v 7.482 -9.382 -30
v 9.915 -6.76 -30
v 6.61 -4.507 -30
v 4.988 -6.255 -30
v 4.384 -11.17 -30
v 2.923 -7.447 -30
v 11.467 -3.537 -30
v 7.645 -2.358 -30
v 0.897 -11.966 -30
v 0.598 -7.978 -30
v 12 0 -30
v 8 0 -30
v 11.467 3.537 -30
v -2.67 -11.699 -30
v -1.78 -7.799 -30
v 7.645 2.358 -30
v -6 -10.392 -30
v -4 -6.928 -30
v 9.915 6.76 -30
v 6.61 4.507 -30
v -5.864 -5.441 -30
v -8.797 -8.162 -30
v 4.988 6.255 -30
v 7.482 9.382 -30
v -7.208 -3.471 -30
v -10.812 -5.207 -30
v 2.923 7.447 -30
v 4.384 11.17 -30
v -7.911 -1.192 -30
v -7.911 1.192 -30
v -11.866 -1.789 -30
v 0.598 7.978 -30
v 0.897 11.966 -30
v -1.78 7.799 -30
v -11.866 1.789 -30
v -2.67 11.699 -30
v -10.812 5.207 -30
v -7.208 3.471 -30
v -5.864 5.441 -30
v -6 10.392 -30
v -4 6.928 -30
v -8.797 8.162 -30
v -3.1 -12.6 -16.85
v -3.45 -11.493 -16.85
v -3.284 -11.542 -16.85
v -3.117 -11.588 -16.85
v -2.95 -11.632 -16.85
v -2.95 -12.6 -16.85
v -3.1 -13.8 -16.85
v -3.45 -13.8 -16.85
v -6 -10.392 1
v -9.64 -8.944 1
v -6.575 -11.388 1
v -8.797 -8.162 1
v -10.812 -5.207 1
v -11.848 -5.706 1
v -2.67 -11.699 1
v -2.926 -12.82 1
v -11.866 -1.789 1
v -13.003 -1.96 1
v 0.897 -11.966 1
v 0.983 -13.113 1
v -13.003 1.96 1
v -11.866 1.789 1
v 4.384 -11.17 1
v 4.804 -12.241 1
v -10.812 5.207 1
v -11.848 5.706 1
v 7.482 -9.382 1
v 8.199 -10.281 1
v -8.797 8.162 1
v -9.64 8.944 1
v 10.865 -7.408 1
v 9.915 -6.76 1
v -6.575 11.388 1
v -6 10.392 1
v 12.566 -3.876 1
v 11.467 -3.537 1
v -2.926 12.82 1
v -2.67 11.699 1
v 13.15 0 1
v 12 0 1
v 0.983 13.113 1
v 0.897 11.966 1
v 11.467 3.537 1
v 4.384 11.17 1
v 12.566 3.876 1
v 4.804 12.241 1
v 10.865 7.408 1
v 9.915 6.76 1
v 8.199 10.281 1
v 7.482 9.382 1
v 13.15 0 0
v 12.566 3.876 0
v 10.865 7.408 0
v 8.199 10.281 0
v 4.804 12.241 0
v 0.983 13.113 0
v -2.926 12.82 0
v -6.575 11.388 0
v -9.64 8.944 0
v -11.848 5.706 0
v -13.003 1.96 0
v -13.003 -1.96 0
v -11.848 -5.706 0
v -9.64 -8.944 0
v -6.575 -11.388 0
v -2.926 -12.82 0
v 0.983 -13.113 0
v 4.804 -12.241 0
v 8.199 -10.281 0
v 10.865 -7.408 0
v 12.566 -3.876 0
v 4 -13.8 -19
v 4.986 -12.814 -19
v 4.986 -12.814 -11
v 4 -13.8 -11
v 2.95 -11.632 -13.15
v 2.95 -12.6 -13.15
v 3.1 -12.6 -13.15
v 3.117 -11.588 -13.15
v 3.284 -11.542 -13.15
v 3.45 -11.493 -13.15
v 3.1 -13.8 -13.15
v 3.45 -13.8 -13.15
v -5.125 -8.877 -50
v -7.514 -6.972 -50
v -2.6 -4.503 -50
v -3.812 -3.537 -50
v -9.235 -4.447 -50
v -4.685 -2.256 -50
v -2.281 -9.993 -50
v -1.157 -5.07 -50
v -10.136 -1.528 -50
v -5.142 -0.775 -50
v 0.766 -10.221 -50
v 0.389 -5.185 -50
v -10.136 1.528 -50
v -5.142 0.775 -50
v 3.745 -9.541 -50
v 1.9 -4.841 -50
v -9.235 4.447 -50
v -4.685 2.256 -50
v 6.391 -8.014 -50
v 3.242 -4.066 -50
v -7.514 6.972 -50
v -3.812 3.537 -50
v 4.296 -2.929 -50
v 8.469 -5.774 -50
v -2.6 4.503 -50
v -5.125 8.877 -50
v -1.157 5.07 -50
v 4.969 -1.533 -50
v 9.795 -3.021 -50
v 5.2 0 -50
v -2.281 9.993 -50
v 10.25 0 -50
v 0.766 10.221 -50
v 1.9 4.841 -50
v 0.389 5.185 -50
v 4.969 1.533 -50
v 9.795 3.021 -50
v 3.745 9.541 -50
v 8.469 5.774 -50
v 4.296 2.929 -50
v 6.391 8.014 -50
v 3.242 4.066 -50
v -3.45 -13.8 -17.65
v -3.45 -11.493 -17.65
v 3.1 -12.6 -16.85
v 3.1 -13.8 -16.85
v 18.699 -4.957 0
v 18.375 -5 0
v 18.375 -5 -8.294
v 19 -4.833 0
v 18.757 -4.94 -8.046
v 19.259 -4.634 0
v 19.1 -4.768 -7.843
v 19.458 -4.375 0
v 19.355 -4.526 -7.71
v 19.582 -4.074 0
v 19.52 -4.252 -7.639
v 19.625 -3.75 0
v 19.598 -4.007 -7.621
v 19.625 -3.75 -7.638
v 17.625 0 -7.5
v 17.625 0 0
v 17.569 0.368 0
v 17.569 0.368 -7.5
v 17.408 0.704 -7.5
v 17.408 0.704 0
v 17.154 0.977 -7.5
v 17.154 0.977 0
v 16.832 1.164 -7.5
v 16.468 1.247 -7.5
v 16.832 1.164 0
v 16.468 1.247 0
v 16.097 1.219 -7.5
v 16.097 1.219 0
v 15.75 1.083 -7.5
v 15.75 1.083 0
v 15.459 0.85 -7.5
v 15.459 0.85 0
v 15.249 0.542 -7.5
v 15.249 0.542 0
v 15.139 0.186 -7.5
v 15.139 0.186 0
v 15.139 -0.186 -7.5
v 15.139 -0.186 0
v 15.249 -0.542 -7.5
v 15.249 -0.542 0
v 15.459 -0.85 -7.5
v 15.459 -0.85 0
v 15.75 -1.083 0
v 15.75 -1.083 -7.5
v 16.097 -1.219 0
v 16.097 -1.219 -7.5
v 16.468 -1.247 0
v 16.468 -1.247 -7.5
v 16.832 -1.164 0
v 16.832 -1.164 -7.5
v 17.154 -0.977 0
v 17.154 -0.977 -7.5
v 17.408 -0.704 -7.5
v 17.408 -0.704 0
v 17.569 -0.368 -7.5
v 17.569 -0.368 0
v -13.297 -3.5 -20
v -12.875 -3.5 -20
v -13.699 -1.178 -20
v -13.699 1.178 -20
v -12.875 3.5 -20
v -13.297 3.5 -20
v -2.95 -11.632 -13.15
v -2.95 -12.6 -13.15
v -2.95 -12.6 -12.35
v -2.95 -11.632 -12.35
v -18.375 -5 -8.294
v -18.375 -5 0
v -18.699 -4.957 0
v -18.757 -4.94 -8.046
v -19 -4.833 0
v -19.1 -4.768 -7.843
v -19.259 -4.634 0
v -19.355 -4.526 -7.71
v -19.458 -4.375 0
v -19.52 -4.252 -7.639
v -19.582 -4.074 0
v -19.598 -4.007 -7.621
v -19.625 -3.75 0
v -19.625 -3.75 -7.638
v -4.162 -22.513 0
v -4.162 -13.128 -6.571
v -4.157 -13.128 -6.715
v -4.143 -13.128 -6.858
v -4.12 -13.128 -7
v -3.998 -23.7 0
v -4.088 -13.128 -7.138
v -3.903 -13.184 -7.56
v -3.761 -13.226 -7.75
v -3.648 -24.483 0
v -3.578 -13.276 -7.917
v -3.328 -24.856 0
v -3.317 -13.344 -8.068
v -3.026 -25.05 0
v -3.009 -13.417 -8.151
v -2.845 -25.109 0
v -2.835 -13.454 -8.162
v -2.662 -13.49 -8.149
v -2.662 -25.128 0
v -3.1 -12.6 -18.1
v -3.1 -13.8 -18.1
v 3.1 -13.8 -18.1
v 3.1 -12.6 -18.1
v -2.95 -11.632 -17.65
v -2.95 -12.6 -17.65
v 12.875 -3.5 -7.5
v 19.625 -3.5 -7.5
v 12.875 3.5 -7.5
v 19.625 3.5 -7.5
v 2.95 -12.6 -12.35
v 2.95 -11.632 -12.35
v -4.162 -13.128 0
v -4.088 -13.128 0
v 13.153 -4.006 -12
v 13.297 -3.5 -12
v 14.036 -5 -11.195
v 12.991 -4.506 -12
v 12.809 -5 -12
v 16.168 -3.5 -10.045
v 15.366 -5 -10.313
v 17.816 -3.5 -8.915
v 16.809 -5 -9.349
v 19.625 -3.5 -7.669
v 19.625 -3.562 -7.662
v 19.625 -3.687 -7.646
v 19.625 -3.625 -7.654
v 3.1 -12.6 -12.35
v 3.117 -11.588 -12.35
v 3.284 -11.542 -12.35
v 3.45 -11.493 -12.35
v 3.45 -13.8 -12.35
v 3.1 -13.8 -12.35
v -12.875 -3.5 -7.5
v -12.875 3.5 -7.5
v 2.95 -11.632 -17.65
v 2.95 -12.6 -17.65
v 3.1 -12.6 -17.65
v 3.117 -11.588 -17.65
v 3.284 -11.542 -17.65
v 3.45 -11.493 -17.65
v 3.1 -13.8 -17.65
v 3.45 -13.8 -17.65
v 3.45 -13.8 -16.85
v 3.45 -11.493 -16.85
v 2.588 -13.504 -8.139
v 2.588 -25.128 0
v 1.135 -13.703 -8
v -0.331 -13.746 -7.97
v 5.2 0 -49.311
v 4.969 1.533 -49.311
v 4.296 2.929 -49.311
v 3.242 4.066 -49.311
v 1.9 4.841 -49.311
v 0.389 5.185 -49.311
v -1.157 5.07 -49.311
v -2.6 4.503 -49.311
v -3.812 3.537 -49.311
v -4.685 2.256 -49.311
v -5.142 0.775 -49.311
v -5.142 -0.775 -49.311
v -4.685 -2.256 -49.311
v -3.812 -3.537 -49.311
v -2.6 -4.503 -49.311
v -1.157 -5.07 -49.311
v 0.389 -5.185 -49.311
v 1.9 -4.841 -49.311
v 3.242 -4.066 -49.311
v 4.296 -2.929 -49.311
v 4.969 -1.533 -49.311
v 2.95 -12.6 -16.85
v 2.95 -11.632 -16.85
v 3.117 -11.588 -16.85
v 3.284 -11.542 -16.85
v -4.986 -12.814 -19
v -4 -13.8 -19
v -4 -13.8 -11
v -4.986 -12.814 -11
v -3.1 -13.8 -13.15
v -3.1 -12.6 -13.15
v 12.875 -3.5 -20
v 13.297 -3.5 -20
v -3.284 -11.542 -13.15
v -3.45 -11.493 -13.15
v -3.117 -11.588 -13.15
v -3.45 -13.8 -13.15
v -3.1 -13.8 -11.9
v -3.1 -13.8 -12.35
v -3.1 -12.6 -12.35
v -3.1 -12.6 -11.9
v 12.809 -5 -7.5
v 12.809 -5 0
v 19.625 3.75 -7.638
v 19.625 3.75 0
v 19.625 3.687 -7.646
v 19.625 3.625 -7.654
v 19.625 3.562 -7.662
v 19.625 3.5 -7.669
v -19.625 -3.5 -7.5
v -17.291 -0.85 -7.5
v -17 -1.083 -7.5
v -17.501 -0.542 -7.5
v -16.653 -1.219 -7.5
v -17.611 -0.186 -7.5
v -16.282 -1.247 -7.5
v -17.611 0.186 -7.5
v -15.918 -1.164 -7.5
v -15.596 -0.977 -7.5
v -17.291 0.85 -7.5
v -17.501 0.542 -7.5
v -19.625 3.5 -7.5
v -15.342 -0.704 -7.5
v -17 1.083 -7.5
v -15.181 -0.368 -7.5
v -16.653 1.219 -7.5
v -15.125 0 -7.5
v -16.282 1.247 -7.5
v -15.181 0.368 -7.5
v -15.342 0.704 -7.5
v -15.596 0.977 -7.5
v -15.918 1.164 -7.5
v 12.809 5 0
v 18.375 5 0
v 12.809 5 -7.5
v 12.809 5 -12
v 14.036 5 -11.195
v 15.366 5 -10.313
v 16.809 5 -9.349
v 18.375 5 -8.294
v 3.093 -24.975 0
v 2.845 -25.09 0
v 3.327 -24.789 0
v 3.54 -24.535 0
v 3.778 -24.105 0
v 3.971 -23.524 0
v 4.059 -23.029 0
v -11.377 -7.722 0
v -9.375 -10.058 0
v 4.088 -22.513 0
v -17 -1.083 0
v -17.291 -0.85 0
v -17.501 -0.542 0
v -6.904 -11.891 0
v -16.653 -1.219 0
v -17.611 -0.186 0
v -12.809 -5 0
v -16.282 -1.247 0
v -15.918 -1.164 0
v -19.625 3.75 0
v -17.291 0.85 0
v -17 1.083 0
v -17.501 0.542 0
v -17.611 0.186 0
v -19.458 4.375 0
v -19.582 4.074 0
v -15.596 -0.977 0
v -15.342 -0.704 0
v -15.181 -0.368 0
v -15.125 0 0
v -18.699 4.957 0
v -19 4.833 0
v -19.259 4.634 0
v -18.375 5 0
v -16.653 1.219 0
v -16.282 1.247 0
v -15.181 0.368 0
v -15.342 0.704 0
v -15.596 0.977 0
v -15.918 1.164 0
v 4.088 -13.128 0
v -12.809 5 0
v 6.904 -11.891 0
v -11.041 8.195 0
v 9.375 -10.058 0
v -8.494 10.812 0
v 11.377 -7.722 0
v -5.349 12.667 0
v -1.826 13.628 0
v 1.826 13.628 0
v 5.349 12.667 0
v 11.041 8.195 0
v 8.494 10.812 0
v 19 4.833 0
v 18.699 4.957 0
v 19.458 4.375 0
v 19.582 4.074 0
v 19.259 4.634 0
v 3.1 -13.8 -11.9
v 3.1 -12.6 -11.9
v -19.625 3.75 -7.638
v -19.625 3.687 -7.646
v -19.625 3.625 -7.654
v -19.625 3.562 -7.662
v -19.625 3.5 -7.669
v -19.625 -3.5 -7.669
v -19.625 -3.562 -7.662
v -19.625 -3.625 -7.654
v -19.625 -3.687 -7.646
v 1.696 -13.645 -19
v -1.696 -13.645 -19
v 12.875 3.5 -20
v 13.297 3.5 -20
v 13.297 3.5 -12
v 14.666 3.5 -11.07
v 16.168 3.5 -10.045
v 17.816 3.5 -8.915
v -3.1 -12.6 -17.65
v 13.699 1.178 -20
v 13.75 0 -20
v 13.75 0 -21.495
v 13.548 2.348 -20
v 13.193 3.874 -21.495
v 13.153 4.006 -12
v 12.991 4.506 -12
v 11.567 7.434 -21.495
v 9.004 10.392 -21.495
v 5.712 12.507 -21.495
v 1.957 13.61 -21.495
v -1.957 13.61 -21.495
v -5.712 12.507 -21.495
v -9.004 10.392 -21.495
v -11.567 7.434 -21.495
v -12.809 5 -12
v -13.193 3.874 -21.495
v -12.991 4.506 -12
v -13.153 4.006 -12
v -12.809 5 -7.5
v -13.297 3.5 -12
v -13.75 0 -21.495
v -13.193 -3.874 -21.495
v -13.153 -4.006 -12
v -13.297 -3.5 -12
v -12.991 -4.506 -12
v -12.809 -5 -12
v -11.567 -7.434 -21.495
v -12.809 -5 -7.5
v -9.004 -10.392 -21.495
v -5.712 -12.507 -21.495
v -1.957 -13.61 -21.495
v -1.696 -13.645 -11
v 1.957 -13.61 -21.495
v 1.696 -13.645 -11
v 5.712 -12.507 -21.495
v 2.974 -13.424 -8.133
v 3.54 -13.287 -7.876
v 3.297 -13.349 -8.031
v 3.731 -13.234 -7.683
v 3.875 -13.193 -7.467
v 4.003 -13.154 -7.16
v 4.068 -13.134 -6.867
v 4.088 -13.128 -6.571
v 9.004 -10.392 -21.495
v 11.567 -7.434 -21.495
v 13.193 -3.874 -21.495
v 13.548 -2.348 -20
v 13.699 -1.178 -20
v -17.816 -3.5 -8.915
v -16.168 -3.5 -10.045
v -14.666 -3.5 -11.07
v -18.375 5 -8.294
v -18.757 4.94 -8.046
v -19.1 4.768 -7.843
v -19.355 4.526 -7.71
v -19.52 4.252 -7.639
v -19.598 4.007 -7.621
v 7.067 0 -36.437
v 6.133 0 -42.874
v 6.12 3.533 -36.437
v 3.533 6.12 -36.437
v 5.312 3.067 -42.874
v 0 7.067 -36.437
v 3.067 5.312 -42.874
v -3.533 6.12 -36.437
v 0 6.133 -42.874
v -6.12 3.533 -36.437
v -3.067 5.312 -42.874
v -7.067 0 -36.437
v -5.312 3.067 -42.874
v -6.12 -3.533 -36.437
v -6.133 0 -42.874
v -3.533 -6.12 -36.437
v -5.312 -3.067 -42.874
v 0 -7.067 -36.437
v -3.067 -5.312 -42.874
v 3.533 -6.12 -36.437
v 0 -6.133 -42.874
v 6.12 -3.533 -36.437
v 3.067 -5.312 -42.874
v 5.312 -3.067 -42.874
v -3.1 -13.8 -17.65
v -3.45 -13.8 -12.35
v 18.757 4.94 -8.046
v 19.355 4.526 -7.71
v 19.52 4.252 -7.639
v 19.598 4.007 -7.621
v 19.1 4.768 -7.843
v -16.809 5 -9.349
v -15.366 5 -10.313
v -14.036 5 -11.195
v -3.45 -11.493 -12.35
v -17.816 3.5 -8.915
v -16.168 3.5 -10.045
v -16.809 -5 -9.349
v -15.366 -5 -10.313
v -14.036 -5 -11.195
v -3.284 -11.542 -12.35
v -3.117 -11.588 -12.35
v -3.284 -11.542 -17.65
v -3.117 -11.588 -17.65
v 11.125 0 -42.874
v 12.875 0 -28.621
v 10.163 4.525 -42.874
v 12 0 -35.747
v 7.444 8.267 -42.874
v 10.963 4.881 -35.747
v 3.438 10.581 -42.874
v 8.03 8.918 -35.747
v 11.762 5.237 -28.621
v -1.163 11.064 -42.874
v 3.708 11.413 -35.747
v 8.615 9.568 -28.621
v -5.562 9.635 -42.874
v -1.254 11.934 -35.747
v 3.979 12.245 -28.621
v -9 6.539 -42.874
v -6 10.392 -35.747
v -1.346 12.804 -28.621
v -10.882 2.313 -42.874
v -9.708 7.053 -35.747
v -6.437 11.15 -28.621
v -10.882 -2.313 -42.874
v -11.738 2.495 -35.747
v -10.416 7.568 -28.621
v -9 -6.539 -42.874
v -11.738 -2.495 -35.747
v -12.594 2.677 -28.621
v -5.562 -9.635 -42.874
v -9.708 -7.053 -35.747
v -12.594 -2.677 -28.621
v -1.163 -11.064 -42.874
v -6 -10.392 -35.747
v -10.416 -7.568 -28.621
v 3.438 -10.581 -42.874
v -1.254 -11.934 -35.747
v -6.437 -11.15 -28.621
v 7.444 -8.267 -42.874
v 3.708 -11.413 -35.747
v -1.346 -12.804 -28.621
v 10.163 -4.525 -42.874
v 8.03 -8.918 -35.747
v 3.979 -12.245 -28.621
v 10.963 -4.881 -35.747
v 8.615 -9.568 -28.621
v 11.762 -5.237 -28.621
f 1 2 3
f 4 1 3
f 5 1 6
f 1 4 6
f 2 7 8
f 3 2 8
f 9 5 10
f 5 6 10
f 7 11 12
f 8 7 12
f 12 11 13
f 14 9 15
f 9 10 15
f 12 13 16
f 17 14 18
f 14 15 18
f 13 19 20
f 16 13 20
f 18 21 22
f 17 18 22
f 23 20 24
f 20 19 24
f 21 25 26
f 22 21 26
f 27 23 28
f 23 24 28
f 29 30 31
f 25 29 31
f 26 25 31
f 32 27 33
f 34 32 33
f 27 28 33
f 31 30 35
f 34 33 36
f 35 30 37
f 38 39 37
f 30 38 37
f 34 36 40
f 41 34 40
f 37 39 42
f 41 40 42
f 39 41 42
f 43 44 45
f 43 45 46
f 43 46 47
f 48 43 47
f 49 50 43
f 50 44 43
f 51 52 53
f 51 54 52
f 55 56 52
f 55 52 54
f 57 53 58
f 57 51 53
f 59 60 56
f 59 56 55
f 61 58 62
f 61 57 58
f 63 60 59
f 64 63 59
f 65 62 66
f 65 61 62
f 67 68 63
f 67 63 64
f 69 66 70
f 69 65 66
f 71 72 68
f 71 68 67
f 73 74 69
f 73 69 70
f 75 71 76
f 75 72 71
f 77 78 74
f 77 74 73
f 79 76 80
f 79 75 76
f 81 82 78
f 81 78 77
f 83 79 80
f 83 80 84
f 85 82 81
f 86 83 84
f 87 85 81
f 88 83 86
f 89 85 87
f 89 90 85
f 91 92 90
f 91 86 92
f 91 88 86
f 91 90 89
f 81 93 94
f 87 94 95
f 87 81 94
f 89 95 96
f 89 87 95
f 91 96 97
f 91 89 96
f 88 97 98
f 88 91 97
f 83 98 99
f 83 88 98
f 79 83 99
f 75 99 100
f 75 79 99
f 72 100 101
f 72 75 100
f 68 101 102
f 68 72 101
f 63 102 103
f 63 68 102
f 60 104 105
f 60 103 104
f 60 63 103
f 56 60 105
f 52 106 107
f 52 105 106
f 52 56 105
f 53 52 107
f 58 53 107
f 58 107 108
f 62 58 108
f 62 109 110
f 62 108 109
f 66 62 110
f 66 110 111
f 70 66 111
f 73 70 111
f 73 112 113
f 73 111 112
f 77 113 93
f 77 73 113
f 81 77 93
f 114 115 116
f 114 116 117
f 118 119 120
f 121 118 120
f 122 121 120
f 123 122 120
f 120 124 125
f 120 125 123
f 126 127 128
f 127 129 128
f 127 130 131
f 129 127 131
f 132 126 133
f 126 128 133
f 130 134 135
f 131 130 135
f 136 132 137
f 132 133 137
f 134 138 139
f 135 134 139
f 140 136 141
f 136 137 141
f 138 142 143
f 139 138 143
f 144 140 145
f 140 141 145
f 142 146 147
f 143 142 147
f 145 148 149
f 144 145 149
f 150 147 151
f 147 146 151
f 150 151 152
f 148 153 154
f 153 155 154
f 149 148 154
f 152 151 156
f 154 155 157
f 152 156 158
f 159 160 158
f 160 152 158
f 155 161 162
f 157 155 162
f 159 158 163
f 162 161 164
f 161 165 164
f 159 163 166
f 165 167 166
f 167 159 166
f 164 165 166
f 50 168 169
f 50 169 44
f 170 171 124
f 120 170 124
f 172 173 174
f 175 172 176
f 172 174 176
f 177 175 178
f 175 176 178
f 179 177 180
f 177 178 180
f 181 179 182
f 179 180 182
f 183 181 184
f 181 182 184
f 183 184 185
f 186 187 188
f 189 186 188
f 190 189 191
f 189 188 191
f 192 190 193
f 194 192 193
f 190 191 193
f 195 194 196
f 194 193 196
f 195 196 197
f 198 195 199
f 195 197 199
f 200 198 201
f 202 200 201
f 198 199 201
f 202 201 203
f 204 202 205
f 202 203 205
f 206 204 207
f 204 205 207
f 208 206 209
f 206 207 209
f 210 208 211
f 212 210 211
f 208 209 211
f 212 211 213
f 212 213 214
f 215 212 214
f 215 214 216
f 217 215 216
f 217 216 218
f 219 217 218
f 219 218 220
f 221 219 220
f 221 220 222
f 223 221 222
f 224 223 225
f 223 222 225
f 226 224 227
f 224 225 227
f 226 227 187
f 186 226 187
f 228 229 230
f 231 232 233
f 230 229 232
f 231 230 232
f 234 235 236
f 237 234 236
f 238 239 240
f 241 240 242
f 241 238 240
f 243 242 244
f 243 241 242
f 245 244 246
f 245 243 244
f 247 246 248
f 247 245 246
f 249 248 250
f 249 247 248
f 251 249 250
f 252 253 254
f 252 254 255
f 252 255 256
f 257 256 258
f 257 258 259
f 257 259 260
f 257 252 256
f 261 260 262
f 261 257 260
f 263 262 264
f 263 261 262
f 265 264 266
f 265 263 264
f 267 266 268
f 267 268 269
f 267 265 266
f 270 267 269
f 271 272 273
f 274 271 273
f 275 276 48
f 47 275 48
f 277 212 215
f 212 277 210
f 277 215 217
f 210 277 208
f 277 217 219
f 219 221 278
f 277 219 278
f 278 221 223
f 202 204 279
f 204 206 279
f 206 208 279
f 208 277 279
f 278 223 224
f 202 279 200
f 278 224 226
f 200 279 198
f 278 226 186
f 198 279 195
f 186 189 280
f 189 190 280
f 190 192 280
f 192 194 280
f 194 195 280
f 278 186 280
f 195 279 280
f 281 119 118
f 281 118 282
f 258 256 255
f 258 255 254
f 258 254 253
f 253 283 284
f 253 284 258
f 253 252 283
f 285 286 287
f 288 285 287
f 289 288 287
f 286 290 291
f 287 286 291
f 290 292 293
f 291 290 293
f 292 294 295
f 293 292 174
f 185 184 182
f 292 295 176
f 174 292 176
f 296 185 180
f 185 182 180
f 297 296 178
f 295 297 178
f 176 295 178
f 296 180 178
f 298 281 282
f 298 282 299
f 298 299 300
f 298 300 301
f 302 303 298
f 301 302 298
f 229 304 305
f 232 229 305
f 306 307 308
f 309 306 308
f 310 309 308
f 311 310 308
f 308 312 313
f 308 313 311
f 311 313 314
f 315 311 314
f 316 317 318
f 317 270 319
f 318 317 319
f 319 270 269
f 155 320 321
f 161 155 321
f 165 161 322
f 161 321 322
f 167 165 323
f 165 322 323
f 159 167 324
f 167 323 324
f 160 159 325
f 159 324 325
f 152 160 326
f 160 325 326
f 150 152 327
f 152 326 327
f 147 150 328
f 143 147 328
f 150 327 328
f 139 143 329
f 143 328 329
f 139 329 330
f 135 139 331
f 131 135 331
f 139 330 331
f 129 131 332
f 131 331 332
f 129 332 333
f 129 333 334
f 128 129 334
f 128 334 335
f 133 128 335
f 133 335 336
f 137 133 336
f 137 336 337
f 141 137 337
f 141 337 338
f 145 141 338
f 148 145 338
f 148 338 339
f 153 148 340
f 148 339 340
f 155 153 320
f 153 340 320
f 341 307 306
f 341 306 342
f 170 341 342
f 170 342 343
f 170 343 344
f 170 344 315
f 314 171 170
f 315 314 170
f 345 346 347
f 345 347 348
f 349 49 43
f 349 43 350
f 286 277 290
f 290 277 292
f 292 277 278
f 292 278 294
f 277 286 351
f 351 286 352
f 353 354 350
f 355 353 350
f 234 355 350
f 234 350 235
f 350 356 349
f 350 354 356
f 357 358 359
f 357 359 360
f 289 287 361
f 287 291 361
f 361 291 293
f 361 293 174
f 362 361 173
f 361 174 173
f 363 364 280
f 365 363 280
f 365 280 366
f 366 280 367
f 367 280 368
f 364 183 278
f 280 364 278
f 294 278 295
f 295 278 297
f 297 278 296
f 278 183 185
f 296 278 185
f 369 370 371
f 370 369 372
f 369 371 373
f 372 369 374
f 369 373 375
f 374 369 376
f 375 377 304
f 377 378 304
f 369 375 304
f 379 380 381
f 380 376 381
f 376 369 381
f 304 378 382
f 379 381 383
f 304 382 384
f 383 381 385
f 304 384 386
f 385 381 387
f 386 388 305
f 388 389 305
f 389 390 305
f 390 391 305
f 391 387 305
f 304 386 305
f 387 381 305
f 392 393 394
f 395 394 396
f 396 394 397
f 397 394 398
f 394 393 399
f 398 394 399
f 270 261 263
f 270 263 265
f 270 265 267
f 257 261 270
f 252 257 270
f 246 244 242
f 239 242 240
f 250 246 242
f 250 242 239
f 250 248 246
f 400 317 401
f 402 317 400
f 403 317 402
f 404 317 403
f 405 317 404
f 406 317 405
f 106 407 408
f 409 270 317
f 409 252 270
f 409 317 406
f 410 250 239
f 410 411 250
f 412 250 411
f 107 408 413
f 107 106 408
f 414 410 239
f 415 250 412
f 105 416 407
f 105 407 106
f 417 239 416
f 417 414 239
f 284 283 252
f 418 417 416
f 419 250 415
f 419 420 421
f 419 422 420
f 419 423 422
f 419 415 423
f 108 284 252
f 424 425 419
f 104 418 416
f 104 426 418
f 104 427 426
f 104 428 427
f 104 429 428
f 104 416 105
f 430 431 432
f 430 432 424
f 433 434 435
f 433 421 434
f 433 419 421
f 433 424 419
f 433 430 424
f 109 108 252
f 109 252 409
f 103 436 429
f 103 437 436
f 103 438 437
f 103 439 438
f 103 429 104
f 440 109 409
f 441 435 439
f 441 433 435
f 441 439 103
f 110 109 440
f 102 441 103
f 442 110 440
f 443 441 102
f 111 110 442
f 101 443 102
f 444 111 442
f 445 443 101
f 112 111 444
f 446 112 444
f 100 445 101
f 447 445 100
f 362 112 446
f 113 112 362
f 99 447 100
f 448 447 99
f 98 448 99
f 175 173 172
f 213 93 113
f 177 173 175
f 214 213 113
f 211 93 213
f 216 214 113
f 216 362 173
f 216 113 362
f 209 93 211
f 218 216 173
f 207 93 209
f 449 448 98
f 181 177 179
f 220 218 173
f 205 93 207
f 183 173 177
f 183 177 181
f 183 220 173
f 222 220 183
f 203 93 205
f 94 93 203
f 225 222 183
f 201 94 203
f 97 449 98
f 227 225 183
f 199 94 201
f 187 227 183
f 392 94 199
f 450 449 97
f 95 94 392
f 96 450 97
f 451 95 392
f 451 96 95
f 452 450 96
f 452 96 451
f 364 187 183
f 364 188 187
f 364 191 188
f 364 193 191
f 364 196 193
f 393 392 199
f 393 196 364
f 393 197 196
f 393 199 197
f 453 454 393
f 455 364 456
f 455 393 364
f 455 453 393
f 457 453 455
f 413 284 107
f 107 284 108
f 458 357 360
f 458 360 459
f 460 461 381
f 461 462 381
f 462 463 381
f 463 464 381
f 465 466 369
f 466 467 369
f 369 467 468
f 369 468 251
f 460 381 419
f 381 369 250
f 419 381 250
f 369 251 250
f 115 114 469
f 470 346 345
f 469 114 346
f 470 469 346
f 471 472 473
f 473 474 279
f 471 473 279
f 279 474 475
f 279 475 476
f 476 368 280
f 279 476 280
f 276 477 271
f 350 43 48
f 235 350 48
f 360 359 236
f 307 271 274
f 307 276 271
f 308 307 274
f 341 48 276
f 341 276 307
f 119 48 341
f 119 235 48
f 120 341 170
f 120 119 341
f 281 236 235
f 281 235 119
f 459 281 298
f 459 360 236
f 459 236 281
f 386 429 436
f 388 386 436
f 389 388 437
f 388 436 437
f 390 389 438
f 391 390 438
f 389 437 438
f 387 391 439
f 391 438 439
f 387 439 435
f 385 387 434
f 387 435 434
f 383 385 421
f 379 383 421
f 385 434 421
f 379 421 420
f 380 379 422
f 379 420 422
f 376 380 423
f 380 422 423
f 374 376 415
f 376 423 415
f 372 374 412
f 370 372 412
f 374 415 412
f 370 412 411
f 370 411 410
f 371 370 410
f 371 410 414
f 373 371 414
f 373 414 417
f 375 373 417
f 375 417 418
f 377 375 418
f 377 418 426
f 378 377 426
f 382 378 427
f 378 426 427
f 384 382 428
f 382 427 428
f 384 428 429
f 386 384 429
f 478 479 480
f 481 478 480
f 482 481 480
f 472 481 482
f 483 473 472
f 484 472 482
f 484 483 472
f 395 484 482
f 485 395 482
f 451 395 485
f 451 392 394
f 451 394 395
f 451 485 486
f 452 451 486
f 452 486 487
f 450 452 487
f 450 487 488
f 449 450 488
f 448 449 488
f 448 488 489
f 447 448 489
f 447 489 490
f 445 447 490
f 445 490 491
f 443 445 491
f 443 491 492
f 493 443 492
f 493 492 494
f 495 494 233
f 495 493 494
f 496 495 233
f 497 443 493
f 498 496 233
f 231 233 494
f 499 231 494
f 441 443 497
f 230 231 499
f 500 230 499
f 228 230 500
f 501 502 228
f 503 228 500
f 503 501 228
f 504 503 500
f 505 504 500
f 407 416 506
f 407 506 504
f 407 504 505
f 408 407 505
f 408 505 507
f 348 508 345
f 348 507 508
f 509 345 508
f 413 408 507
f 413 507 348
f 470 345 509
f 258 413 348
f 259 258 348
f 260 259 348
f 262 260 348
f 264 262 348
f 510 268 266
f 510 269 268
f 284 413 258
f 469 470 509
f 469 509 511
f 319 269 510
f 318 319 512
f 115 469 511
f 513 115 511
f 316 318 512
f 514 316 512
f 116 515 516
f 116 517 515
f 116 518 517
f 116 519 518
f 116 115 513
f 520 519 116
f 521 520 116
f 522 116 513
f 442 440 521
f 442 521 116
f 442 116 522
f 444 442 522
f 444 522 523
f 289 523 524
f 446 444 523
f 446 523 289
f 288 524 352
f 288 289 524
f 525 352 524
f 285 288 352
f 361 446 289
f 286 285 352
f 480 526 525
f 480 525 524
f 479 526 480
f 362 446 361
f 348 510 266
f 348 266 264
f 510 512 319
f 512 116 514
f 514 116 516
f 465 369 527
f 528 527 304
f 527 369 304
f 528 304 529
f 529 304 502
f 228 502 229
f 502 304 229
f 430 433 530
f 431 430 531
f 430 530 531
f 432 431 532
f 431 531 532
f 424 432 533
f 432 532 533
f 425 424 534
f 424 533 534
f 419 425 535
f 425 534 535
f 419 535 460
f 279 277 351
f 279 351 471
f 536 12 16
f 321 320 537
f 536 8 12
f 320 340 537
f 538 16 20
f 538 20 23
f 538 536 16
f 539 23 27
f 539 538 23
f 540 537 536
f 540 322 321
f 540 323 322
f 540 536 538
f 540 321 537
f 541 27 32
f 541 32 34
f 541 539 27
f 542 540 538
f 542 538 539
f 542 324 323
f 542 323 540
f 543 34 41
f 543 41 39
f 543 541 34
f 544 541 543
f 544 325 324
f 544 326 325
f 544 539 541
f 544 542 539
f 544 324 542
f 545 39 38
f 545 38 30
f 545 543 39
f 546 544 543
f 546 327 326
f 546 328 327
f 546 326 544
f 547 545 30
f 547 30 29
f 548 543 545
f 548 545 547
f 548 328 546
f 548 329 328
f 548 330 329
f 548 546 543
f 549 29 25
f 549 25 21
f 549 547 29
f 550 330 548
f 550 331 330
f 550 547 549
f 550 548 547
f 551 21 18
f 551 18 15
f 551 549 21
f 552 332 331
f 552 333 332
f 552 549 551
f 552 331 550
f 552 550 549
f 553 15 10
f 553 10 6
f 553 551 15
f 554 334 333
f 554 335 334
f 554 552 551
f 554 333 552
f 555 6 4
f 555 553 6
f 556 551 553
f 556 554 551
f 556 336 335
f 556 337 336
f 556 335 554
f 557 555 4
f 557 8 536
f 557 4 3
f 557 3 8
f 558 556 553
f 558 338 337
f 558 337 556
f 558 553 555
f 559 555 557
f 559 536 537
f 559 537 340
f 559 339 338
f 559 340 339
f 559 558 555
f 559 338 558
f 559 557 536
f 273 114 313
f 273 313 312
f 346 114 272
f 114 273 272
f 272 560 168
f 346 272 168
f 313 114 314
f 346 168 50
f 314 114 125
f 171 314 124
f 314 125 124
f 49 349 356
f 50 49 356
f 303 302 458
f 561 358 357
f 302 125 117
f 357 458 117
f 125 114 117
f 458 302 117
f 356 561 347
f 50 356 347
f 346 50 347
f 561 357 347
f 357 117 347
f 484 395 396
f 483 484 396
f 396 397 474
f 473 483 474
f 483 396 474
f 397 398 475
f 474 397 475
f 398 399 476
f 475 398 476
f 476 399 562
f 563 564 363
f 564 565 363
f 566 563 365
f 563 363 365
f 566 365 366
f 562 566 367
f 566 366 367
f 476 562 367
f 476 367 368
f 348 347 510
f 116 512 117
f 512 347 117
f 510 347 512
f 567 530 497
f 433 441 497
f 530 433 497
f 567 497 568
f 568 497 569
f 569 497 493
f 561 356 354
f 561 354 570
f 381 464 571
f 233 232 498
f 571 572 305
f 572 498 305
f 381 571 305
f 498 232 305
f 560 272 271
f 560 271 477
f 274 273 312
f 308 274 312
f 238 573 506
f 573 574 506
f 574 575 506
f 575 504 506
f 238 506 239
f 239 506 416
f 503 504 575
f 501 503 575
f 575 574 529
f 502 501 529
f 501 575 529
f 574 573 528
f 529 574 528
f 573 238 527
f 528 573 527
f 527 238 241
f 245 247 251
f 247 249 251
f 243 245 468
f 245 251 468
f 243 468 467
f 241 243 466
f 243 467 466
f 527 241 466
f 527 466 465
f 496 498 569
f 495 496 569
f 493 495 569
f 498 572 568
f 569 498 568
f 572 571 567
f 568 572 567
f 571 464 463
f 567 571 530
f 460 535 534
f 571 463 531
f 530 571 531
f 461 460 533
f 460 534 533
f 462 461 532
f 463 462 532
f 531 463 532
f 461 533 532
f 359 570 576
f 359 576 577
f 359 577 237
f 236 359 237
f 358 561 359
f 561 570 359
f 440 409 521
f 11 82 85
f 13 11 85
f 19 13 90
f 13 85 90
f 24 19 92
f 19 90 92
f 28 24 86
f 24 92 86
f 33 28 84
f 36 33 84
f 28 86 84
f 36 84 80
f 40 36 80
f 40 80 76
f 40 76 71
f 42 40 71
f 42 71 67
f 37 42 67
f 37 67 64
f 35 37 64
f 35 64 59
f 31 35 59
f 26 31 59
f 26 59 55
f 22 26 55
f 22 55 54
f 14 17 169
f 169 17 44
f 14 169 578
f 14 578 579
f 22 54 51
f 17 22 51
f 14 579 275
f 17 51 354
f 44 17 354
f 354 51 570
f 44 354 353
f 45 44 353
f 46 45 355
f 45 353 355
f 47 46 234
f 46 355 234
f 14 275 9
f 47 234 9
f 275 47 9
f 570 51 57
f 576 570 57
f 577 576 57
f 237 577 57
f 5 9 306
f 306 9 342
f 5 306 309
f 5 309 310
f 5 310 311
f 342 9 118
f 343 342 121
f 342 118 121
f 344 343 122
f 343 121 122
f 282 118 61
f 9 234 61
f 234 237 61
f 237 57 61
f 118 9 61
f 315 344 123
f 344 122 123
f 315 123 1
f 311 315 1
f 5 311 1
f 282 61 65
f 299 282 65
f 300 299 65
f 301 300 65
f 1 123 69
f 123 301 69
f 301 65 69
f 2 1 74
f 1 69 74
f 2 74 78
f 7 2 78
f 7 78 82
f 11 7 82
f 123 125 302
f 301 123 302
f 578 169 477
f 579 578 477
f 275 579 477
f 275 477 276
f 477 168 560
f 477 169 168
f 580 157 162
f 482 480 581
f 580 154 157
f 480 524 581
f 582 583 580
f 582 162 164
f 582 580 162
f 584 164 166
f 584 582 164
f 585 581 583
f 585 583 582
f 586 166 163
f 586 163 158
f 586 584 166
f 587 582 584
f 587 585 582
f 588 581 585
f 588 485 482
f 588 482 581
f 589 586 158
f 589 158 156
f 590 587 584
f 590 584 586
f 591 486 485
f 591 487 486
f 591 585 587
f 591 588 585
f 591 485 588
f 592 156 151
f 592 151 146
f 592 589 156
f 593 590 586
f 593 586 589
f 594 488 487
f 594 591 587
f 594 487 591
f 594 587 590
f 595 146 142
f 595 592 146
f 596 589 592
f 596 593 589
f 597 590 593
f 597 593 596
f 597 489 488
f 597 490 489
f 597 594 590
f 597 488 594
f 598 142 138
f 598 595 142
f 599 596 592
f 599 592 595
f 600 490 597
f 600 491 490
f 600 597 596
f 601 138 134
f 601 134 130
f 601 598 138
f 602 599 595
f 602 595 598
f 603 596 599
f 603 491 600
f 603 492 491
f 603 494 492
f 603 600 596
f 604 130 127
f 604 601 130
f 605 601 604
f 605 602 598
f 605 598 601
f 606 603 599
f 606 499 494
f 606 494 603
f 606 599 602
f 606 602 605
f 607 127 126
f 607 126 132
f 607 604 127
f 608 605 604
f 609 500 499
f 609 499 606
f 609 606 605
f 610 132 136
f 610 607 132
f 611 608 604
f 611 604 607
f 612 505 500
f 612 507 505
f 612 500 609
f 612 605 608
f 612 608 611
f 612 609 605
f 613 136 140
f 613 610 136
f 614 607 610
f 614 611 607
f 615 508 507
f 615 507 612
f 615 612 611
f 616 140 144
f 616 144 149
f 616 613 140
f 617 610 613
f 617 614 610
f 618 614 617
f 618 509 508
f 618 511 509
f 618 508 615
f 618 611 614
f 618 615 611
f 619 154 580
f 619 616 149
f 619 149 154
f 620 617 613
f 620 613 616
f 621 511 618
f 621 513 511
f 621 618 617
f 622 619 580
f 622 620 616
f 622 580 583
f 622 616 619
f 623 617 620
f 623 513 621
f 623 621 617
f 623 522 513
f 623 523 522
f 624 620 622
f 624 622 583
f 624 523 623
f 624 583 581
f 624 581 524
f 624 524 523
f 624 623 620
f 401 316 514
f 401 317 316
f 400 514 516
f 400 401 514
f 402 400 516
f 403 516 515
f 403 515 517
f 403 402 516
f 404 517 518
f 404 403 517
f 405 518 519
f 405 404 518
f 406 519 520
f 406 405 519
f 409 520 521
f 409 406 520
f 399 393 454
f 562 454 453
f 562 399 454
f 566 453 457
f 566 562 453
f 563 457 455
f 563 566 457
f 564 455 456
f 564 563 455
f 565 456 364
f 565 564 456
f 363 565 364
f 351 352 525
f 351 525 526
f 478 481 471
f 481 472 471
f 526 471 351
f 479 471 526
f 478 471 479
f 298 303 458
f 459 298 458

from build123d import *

# Parameters (mm, degrees)
SKETCH1_R               = 13.75
SKETCH1_R_2             = 12
BOSS_EXTRUDE1_DEPTH     = 50
SKETCH2_R               = 1.25
BOSS_EXTRUDE2_DEPTH     = 7.5
SKETCH4_R               = 13.25
BOSS_EXTRUDE3_DEPTH     = 20
SKETCH8_R               = 5.2
CUT_EXTRUDE2_DEPTH      = 20
CHAMFER2_SIZE           = 2.8
CHAMFER2_SIZE2          = 19.311263845
BOSS_EXTRUDE4_DEPTH     = 0.991311543
SKETCH9_W               = 6.2
SKETCH9_H               = 6.2
CUT_EXTRUDE3_DEPTH      = 1.2
CUT_EXTRUDE4_REACH      = 62.367
CUT_EXTRUDE4_END_RADIUS = 12
SKETCH10_W              = 0.5
SKETCH10_H              = 0.8
BOSS_EXTRUDE5_START     = 1
SKETCH11_R              = 13.15
SKETCH11_R_2            = 12
BOSS_EXTRUDE5_DEPTH     = 1
CHAMFER4_SIZE           = 1
SKETCH12_W              = 8.25
SKETCH12_H              = 12
BOSS_EXTRUDE6_DEPTH     = 8.5
CHAMFER5_SIZE           = 8.5
CHAMFER5_SIZE_2         = 12.139258057
FILLET3_R               = 1.5
SKETCH13_W              = 7
SKETCH13_H              = 7
CUT_EXTRUDE5_DEPTH      = 12.5
CHAMFER6_SIZE           = 4.5
CHAMFER6_SIZE_2         = 6.42666603
CHAMFER3_SIZE           = 3.5
CHAMFER3_SIZE2          = 28.505212498
FILLET4_R               = 1.25


with BuildPart() as part:
    # Sketch1 → Boss-Extrude1 (new body)
    with BuildSketch(Plane.XY):
        Circle(SKETCH1_R)
        Circle(SKETCH1_R_2, mode=Mode.SUBTRACT)
    extrude(amount=-BOSS_EXTRUDE1_DEPTH)

    # Sketch2 → Boss-Extrude2 (add)
    # profile 1 of 2: a face of its own
    with BuildSketch(Plane.XY):
        with BuildLine():
            ThreePointArc((-12.808688457, -5), (-13.75, 0), (-12.808688457, 5))
            Line((-12.808688457, 5), (-19.624999957, 5))
            Line((-19.624999957, 5), (-19.624999957, -5))
            Line((-19.624999957, -5), (-12.808688457, -5))
        make_face()
        with Locations((-16.375, 0)):
            Circle(SKETCH2_R, mode=Mode.SUBTRACT)
    # profile 2 of 2: a face of its own
    with BuildSketch(Plane.XY):
        with BuildLine():
            Line((19.624999957, 5), (12.808688457, 5))
            ThreePointArc((12.808688457, 5), (13.512623104, 2.54391762), (13.75, 0))
            ThreePointArc((13.75, 0), (13.512623104, -2.54391762), (12.808688457, -5))
            Line((12.808688457, -5), (19.624999957, -5))
            Line((19.624999957, -5), (19.624999957, 5))
        make_face()
        with Locations((16.375, 0)):
            Circle(SKETCH2_R, mode=Mode.SUBTRACT)
    extrude(amount=-BOSS_EXTRUDE2_DEPTH)

    # Sketch4 → Boss-Extrude3 (add)
    with BuildSketch(Plane(origin=(0, 0, -50), x_dir=(-1, 0, 0), z_dir=(0, 0, -1))):
        Circle(SKETCH4_R)
    extrude(amount=-BOSS_EXTRUDE3_DEPTH)

    # Sketch8 → Cut-Extrude2 (cut)
    with BuildSketch(Plane.XY.offset(-30)):
        Circle(SKETCH8_R)
    extrude(amount=-CUT_EXTRUDE2_DEPTH, mode=Mode.SUBTRACT)

    # Chamfer2
    chamfer2_edges = [part.edges().sort_by_distance(p)[0] for p in [
        (-5.2, 0, -30),
    ]]
    chamfer2_side = [part.faces().sort_by_distance(p)[0] for p in [
        (-11.660588745, 0, -30),
    ]]
    chamfer(chamfer2_edges, length=CHAMFER2_SIZE, length2=CHAMFER2_SIZE2, reference=chamfer2_side[0])

    # 3DSketch3 → Boss-Extrude4 (add)
    with BuildSketch(Plane(origin=(-5, -13.8, -11), x_dir=(0.7808688094430304, 0, -0.6246950475544243), z_dir=(0, -1, 0))):
        Polygon((0, 0), (7.808688094, 6.246950476), (12.806248475, 0), (4.99756038, -6.246950476), align=None)
    extrude(amount=-BOSS_EXTRUDE4_DEPTH)

    # Sketch9 → Cut-Extrude3 (cut)
    with BuildSketch(Plane.XZ.offset(13.8)):
        with Locations((0, -15)):
            Rectangle(SKETCH9_W, SKETCH9_H)
    extrude(amount=-CUT_EXTRUDE3_DEPTH, mode=Mode.SUBTRACT)

    # Cut-Extrude4: up to this cylinder (the profile starts outside it)
    cut_extrude4_end = Plane(origin=(0, 0, -15), z_dir=(0, 0, 1)) * Cylinder(CUT_EXTRUDE4_END_RADIUS, 154.234, mode=Mode.PRIVATE)
    # Sketch10 → Cut-Extrude4 (cut, up to the surface)
    with BuildSketch(Plane.XZ.offset(13.8), mode=Mode.PRIVATE) as cut_extrude4_sk1:
        with Locations((3.2, -12.75)):
            Rectangle(SKETCH10_W, SKETCH10_H)
    cut_extrude4_tool1 = extrude(cut_extrude4_sk1.sketch, amount=-CUT_EXTRUDE4_REACH, mode=Mode.PRIVATE) - cut_extrude4_end
    add(cut_extrude4_tool1.solids().sort_by_distance((3.2, -13.8, -12.75))[0], mode=Mode.SUBTRACT)
    # Sketch10 → Cut-Extrude4 (cut, up to the surface)
    with BuildSketch(Plane.XZ.offset(13.8), mode=Mode.PRIVATE) as cut_extrude4_sk2:
        with Locations((-3.2, -12.75)):
            Rectangle(SKETCH10_W, SKETCH10_H)
    cut_extrude4_tool2 = extrude(cut_extrude4_sk2.sketch, amount=-CUT_EXTRUDE4_REACH, mode=Mode.PRIVATE) - cut_extrude4_end
    add(cut_extrude4_tool2.solids().sort_by_distance((-3.2, -13.8, -12.75))[0], mode=Mode.SUBTRACT)
    # Sketch10 → Cut-Extrude4 (cut, up to the surface)
    with BuildSketch(Plane.XZ.offset(13.8), mode=Mode.PRIVATE) as cut_extrude4_sk3:
        with Locations((3.2, -17.25)):
            Rectangle(SKETCH10_W, SKETCH10_H)
    cut_extrude4_tool3 = extrude(cut_extrude4_sk3.sketch, amount=-CUT_EXTRUDE4_REACH, mode=Mode.PRIVATE) - cut_extrude4_end
    add(cut_extrude4_tool3.solids().sort_by_distance((3.2, -13.8, -17.25))[0], mode=Mode.SUBTRACT)
    # Sketch10 → Cut-Extrude4 (cut, up to the surface)
    with BuildSketch(Plane.XZ.offset(13.8), mode=Mode.PRIVATE) as cut_extrude4_sk4:
        with Locations((-3.2, -17.25)):
            Rectangle(SKETCH10_W, SKETCH10_H)
    cut_extrude4_tool4 = extrude(cut_extrude4_sk4.sketch, amount=-CUT_EXTRUDE4_REACH, mode=Mode.PRIVATE) - cut_extrude4_end
    add(cut_extrude4_tool4.solids().sort_by_distance((-3.2, -13.8, -17.25))[0], mode=Mode.SUBTRACT)

    # Sketch11 → Boss-Extrude5 (add)
    with BuildSketch(Plane.XY.offset(BOSS_EXTRUDE5_START)):
        Circle(SKETCH11_R)
        Circle(SKETCH11_R_2, mode=Mode.SUBTRACT)
    extrude(amount=-BOSS_EXTRUDE5_DEPTH)

    # Chamfer4
    # the kernel refuses this chamfer: 1 mm, written as the material it takes off along each edge
    with BuildSketch(Plane(origin=(-5, -13.8, -21.571682988), x_dir=(0.9996219169112968, -0.027495876610585647, 0), z_dir=(0, 0, 1))) as chamfer4_piece_1_section:
        Polygon((CHAMFER4_SIZE * 0.999621916911, CHAMFER4_SIZE * 0.0274958766106), (-CHAMFER4_SIZE * 0.0274958766106, CHAMFER4_SIZE * 0.999621916911), (0, 0), align=None)
    chamfer4_piece_1 = extrude(amount=13.143365976, mode=Mode.PRIVATE)
    chamfer4_piece_1 = chamfer4_piece_1 - Plane(origin=(0, 0, -15), x_dir=(1, 0, 0), z_dir=(0, 0, 1)) * Cylinder(13.75, 31, mode=Mode.PRIVATE)
    add(chamfer4_piece_1, mode=Mode.SUBTRACT)
    with BuildSketch(Plane(origin=(5, -13.8, -8.428317012), x_dir=(0.02749587661058651, 0.9996219169112968, 0), z_dir=(0, 0, -1))) as chamfer4_piece_2_section:
        Polygon((CHAMFER4_SIZE * 0.999621916911, -CHAMFER4_SIZE * 0.0274958766106), (-CHAMFER4_SIZE * 0.0274958766106, -CHAMFER4_SIZE * 0.999621916911), (0, 0), align=None)
    chamfer4_piece_2 = extrude(amount=13.143365976, mode=Mode.PRIVATE)
    chamfer4_piece_2 = chamfer4_piece_2 - Plane(origin=(0, 0, -15), x_dir=(1, 0, 0), z_dir=(0, 0, 1)) * Cylinder(13.75, 31, mode=Mode.PRIVATE)
    add(chamfer4_piece_2, mode=Mode.SUBTRACT)

    # Sketch12 → Boss-Extrude6 (add)
    with BuildSketch(Plane.XY):
        with Locations((-0.036830357, -19.128189859)):
            Rectangle(SKETCH12_W, SKETCH12_H)
    extrude(amount=-BOSS_EXTRUDE6_DEPTH)

    # Chamfer5
    # the kernel refuses this chamfer: 12.139258057, 8.5 mm, written as the material it takes off along each edge
    with BuildSketch(Plane(origin=(-35.512098327, -25.128189859, -8.5), x_dir=(0, -0.045263737714021236, 0.9989750717851554), z_dir=(1, 0, 0))) as chamfer5_piece_1_section:
        Polygon((CHAMFER5_SIZE * 0.998975071785, -CHAMFER5_SIZE * 0.045263737714), (-CHAMFER5_SIZE_2 * 0.0452637377152, -CHAMFER5_SIZE_2 * 0.998975071811), (0, 0), align=None)
    chamfer5_piece_1 = extrude(amount=70.95053594, mode=Mode.PRIVATE)
    chamfer5_piece_1 = chamfer5_piece_1 - Plane(origin=(0, 0, -5.73810834), x_dir=(1, 0, 0), z_dir=(0, 0, 1)) * Cylinder(13.75, 191, mode=Mode.PRIVATE)
    add(chamfer5_piece_1, mode=Mode.SUBTRACT)

    # Fillet3
    fillet3_edges = [part.edges().sort_by_distance(p)[0] for p in [
        (-4.161830357, -19.128189859, -4.201245229),
        (4.088169643, -19.128189859, -4.201245229),
    ]]
    fillet(fillet3_edges, radius=FILLET3_R)

    # Sketch13 → Cut-Extrude5 (cut)
    with BuildSketch(Plane(origin=(0, 0, -7.5), x_dir=(-1, 0, 0), z_dir=(0, 0, -1))):
        with Locations((-16.375, 0)):
            Rectangle(SKETCH13_W, SKETCH13_H)
        with Locations((16.375, 0)):
            Rectangle(SKETCH13_W, SKETCH13_H)
    extrude(amount=CUT_EXTRUDE5_DEPTH, mode=Mode.SUBTRACT)

    # Chamfer6
    # the kernel refuses this chamfer: 6.42666603, 4.5 mm, written as the material it adds along each edge
    with BuildSketch(Plane(origin=(0, 0, -7.5), x_dir=(-0.008443836697967595, 0.999964350175454, 0), z_dir=(-0.999964350175454, -0.008443836697967595, 0))) as chamfer6_piece_1_section:
        Polygon((13.75, CHAMFER6_SIZE), (13.75 + CHAMFER6_SIZE_2, 0), (13.75, 0), align=None)
    chamfer6_piece_1 = revolve(axis=Axis((0, 0, -7.5), (0, 0, -1)), revolution_arc=144.897264771, mode=Mode.PRIVATE)
    chamfer6_piece_1 = split(chamfer6_piece_1, bisect_by=Plane(origin=(15.287184037, 5, -9.004359876), z_dir=(0, -1, 0)), keep=Keep.TOP, mode=Mode.PRIVATE)
    chamfer6_piece_1 = split(chamfer6_piece_1, bisect_by=Plane(origin=(19.624999957, 4.253690529, -9.004359876), z_dir=(-1, 0, 0)), keep=Keep.TOP, mode=Mode.PRIVATE)
    chamfer6_piece_1 = split(chamfer6_piece_1, bisect_by=Plane(origin=(15.287184037, 3.5, -9.004359876), z_dir=(0, 1, 0)), keep=Keep.TOP, mode=Mode.PRIVATE)
    add(chamfer6_piece_1)
    with BuildSketch(Plane(origin=(0, 0, -7.5), x_dir=(-0.008443836697967595, 0.999964350175454, 0), z_dir=(-0.999964350175454, -0.008443836697967595, 0))) as chamfer6_piece_2_section:
        Polygon((13.75, CHAMFER6_SIZE), (13.75 + CHAMFER6_SIZE_2, 0), (13.75, 0), align=None)
    chamfer6_piece_2 = revolve(axis=Axis((0, 0, -7.5), (0, 0, -1)), revolution_arc=144.897264771, mode=Mode.PRIVATE)
    chamfer6_piece_2 = split(chamfer6_piece_2, bisect_by=Plane(origin=(19.624999957, -4.253690529, -9.004359876), z_dir=(-1, 0, 0)), keep=Keep.TOP, mode=Mode.PRIVATE)
    chamfer6_piece_2 = split(chamfer6_piece_2, bisect_by=Plane(origin=(15.287184037, -3.5, -9.004359876), z_dir=(0, -1, 0)), keep=Keep.TOP, mode=Mode.PRIVATE)
    chamfer6_piece_2 = split(chamfer6_piece_2, bisect_by=Plane(origin=(15.287184037, -5, -9.004359876), z_dir=(0, 1, 0)), keep=Keep.TOP, mode=Mode.PRIVATE)
    add(chamfer6_piece_2)
    with BuildSketch(Plane(origin=(0, 0, -7.5), x_dir=(0.008443836697964339, -0.999964350175454, 0), z_dir=(0.999964350175454, 0.008443836697964339, 0))) as chamfer6_piece_3_section:
        Polygon((13.75, CHAMFER6_SIZE), (13.75 + CHAMFER6_SIZE_2, 0), (13.75, 0), align=None)
    chamfer6_piece_3 = revolve(axis=Axis((0, 0, -7.5), (0, 0, -1)), revolution_arc=144.897264771, mode=Mode.PRIVATE)
    chamfer6_piece_3 = split(chamfer6_piece_3, bisect_by=Plane(origin=(-12.906482524, -5, -11.926294402), z_dir=(0, 1, 0)), keep=Keep.TOP, mode=Mode.PRIVATE)
    chamfer6_piece_3 = split(chamfer6_piece_3, bisect_by=Plane(origin=(-19.624999957, -4.934370219, -11.926294402), z_dir=(1, 0, 0)), keep=Keep.TOP, mode=Mode.PRIVATE)
    chamfer6_piece_3 = split(chamfer6_piece_3, bisect_by=Plane(origin=(-12.906482524, -3.5, -11.926294402), z_dir=(0, -1, 0)), keep=Keep.TOP, mode=Mode.PRIVATE)
    add(chamfer6_piece_3)
    with BuildSketch(Plane(origin=(0, 0, -7.5), x_dir=(0.008443836697964339, -0.999964350175454, 0), z_dir=(0.999964350175454, 0.008443836697964339, 0))) as chamfer6_piece_4_section:
        Polygon((13.75, CHAMFER6_SIZE), (13.75 + CHAMFER6_SIZE_2, 0), (13.75, 0), align=None)
    chamfer6_piece_4 = revolve(axis=Axis((0, 0, -7.5), (0, 0, -1)), revolution_arc=144.897264771, mode=Mode.PRIVATE)
    chamfer6_piece_4 = split(chamfer6_piece_4, bisect_by=Plane(origin=(-19.624999957, 4.25463743, -11.933336397), z_dir=(1, 0, 0)), keep=Keep.TOP, mode=Mode.PRIVATE)
    chamfer6_piece_4 = split(chamfer6_piece_4, bisect_by=Plane(origin=(-13.117325859, 3.5, -11.933336397), z_dir=(0, 1, 0)), keep=Keep.TOP, mode=Mode.PRIVATE)
    chamfer6_piece_4 = split(chamfer6_piece_4, bisect_by=Plane(origin=(-13.117325859, 5, -11.933336397), z_dir=(0, -1, 0)), keep=Keep.TOP, mode=Mode.PRIVATE)
    add(chamfer6_piece_4)

    # Chamfer3
    chamfer3_edges = [part.edges().sort_by_distance(p)[0] for p in [
        (-13.75, 0, -50),
    ]]
    chamfer3_side = [part.faces().sort_by_distance(p)[0] for p in [
        (-13.36109127, 0, -50),
    ]]
    chamfer(chamfer3_edges, length=CHAMFER3_SIZE, length2=CHAMFER3_SIZE2, reference=chamfer3_side[0])

    # Fillet4
    fillet4_edges = [part.edges().sort_by_distance(p)[0] for p in [
        (-19.624999957, -5, -3.75),
        (-19.624999957, 5, -3.75),
        (19.624999957, 5, -3.75),
        (19.624999957, -5, -3.75),
    ]]
    fillet(fillet4_edges, radius=FILLET4_R)


solid = part.part
